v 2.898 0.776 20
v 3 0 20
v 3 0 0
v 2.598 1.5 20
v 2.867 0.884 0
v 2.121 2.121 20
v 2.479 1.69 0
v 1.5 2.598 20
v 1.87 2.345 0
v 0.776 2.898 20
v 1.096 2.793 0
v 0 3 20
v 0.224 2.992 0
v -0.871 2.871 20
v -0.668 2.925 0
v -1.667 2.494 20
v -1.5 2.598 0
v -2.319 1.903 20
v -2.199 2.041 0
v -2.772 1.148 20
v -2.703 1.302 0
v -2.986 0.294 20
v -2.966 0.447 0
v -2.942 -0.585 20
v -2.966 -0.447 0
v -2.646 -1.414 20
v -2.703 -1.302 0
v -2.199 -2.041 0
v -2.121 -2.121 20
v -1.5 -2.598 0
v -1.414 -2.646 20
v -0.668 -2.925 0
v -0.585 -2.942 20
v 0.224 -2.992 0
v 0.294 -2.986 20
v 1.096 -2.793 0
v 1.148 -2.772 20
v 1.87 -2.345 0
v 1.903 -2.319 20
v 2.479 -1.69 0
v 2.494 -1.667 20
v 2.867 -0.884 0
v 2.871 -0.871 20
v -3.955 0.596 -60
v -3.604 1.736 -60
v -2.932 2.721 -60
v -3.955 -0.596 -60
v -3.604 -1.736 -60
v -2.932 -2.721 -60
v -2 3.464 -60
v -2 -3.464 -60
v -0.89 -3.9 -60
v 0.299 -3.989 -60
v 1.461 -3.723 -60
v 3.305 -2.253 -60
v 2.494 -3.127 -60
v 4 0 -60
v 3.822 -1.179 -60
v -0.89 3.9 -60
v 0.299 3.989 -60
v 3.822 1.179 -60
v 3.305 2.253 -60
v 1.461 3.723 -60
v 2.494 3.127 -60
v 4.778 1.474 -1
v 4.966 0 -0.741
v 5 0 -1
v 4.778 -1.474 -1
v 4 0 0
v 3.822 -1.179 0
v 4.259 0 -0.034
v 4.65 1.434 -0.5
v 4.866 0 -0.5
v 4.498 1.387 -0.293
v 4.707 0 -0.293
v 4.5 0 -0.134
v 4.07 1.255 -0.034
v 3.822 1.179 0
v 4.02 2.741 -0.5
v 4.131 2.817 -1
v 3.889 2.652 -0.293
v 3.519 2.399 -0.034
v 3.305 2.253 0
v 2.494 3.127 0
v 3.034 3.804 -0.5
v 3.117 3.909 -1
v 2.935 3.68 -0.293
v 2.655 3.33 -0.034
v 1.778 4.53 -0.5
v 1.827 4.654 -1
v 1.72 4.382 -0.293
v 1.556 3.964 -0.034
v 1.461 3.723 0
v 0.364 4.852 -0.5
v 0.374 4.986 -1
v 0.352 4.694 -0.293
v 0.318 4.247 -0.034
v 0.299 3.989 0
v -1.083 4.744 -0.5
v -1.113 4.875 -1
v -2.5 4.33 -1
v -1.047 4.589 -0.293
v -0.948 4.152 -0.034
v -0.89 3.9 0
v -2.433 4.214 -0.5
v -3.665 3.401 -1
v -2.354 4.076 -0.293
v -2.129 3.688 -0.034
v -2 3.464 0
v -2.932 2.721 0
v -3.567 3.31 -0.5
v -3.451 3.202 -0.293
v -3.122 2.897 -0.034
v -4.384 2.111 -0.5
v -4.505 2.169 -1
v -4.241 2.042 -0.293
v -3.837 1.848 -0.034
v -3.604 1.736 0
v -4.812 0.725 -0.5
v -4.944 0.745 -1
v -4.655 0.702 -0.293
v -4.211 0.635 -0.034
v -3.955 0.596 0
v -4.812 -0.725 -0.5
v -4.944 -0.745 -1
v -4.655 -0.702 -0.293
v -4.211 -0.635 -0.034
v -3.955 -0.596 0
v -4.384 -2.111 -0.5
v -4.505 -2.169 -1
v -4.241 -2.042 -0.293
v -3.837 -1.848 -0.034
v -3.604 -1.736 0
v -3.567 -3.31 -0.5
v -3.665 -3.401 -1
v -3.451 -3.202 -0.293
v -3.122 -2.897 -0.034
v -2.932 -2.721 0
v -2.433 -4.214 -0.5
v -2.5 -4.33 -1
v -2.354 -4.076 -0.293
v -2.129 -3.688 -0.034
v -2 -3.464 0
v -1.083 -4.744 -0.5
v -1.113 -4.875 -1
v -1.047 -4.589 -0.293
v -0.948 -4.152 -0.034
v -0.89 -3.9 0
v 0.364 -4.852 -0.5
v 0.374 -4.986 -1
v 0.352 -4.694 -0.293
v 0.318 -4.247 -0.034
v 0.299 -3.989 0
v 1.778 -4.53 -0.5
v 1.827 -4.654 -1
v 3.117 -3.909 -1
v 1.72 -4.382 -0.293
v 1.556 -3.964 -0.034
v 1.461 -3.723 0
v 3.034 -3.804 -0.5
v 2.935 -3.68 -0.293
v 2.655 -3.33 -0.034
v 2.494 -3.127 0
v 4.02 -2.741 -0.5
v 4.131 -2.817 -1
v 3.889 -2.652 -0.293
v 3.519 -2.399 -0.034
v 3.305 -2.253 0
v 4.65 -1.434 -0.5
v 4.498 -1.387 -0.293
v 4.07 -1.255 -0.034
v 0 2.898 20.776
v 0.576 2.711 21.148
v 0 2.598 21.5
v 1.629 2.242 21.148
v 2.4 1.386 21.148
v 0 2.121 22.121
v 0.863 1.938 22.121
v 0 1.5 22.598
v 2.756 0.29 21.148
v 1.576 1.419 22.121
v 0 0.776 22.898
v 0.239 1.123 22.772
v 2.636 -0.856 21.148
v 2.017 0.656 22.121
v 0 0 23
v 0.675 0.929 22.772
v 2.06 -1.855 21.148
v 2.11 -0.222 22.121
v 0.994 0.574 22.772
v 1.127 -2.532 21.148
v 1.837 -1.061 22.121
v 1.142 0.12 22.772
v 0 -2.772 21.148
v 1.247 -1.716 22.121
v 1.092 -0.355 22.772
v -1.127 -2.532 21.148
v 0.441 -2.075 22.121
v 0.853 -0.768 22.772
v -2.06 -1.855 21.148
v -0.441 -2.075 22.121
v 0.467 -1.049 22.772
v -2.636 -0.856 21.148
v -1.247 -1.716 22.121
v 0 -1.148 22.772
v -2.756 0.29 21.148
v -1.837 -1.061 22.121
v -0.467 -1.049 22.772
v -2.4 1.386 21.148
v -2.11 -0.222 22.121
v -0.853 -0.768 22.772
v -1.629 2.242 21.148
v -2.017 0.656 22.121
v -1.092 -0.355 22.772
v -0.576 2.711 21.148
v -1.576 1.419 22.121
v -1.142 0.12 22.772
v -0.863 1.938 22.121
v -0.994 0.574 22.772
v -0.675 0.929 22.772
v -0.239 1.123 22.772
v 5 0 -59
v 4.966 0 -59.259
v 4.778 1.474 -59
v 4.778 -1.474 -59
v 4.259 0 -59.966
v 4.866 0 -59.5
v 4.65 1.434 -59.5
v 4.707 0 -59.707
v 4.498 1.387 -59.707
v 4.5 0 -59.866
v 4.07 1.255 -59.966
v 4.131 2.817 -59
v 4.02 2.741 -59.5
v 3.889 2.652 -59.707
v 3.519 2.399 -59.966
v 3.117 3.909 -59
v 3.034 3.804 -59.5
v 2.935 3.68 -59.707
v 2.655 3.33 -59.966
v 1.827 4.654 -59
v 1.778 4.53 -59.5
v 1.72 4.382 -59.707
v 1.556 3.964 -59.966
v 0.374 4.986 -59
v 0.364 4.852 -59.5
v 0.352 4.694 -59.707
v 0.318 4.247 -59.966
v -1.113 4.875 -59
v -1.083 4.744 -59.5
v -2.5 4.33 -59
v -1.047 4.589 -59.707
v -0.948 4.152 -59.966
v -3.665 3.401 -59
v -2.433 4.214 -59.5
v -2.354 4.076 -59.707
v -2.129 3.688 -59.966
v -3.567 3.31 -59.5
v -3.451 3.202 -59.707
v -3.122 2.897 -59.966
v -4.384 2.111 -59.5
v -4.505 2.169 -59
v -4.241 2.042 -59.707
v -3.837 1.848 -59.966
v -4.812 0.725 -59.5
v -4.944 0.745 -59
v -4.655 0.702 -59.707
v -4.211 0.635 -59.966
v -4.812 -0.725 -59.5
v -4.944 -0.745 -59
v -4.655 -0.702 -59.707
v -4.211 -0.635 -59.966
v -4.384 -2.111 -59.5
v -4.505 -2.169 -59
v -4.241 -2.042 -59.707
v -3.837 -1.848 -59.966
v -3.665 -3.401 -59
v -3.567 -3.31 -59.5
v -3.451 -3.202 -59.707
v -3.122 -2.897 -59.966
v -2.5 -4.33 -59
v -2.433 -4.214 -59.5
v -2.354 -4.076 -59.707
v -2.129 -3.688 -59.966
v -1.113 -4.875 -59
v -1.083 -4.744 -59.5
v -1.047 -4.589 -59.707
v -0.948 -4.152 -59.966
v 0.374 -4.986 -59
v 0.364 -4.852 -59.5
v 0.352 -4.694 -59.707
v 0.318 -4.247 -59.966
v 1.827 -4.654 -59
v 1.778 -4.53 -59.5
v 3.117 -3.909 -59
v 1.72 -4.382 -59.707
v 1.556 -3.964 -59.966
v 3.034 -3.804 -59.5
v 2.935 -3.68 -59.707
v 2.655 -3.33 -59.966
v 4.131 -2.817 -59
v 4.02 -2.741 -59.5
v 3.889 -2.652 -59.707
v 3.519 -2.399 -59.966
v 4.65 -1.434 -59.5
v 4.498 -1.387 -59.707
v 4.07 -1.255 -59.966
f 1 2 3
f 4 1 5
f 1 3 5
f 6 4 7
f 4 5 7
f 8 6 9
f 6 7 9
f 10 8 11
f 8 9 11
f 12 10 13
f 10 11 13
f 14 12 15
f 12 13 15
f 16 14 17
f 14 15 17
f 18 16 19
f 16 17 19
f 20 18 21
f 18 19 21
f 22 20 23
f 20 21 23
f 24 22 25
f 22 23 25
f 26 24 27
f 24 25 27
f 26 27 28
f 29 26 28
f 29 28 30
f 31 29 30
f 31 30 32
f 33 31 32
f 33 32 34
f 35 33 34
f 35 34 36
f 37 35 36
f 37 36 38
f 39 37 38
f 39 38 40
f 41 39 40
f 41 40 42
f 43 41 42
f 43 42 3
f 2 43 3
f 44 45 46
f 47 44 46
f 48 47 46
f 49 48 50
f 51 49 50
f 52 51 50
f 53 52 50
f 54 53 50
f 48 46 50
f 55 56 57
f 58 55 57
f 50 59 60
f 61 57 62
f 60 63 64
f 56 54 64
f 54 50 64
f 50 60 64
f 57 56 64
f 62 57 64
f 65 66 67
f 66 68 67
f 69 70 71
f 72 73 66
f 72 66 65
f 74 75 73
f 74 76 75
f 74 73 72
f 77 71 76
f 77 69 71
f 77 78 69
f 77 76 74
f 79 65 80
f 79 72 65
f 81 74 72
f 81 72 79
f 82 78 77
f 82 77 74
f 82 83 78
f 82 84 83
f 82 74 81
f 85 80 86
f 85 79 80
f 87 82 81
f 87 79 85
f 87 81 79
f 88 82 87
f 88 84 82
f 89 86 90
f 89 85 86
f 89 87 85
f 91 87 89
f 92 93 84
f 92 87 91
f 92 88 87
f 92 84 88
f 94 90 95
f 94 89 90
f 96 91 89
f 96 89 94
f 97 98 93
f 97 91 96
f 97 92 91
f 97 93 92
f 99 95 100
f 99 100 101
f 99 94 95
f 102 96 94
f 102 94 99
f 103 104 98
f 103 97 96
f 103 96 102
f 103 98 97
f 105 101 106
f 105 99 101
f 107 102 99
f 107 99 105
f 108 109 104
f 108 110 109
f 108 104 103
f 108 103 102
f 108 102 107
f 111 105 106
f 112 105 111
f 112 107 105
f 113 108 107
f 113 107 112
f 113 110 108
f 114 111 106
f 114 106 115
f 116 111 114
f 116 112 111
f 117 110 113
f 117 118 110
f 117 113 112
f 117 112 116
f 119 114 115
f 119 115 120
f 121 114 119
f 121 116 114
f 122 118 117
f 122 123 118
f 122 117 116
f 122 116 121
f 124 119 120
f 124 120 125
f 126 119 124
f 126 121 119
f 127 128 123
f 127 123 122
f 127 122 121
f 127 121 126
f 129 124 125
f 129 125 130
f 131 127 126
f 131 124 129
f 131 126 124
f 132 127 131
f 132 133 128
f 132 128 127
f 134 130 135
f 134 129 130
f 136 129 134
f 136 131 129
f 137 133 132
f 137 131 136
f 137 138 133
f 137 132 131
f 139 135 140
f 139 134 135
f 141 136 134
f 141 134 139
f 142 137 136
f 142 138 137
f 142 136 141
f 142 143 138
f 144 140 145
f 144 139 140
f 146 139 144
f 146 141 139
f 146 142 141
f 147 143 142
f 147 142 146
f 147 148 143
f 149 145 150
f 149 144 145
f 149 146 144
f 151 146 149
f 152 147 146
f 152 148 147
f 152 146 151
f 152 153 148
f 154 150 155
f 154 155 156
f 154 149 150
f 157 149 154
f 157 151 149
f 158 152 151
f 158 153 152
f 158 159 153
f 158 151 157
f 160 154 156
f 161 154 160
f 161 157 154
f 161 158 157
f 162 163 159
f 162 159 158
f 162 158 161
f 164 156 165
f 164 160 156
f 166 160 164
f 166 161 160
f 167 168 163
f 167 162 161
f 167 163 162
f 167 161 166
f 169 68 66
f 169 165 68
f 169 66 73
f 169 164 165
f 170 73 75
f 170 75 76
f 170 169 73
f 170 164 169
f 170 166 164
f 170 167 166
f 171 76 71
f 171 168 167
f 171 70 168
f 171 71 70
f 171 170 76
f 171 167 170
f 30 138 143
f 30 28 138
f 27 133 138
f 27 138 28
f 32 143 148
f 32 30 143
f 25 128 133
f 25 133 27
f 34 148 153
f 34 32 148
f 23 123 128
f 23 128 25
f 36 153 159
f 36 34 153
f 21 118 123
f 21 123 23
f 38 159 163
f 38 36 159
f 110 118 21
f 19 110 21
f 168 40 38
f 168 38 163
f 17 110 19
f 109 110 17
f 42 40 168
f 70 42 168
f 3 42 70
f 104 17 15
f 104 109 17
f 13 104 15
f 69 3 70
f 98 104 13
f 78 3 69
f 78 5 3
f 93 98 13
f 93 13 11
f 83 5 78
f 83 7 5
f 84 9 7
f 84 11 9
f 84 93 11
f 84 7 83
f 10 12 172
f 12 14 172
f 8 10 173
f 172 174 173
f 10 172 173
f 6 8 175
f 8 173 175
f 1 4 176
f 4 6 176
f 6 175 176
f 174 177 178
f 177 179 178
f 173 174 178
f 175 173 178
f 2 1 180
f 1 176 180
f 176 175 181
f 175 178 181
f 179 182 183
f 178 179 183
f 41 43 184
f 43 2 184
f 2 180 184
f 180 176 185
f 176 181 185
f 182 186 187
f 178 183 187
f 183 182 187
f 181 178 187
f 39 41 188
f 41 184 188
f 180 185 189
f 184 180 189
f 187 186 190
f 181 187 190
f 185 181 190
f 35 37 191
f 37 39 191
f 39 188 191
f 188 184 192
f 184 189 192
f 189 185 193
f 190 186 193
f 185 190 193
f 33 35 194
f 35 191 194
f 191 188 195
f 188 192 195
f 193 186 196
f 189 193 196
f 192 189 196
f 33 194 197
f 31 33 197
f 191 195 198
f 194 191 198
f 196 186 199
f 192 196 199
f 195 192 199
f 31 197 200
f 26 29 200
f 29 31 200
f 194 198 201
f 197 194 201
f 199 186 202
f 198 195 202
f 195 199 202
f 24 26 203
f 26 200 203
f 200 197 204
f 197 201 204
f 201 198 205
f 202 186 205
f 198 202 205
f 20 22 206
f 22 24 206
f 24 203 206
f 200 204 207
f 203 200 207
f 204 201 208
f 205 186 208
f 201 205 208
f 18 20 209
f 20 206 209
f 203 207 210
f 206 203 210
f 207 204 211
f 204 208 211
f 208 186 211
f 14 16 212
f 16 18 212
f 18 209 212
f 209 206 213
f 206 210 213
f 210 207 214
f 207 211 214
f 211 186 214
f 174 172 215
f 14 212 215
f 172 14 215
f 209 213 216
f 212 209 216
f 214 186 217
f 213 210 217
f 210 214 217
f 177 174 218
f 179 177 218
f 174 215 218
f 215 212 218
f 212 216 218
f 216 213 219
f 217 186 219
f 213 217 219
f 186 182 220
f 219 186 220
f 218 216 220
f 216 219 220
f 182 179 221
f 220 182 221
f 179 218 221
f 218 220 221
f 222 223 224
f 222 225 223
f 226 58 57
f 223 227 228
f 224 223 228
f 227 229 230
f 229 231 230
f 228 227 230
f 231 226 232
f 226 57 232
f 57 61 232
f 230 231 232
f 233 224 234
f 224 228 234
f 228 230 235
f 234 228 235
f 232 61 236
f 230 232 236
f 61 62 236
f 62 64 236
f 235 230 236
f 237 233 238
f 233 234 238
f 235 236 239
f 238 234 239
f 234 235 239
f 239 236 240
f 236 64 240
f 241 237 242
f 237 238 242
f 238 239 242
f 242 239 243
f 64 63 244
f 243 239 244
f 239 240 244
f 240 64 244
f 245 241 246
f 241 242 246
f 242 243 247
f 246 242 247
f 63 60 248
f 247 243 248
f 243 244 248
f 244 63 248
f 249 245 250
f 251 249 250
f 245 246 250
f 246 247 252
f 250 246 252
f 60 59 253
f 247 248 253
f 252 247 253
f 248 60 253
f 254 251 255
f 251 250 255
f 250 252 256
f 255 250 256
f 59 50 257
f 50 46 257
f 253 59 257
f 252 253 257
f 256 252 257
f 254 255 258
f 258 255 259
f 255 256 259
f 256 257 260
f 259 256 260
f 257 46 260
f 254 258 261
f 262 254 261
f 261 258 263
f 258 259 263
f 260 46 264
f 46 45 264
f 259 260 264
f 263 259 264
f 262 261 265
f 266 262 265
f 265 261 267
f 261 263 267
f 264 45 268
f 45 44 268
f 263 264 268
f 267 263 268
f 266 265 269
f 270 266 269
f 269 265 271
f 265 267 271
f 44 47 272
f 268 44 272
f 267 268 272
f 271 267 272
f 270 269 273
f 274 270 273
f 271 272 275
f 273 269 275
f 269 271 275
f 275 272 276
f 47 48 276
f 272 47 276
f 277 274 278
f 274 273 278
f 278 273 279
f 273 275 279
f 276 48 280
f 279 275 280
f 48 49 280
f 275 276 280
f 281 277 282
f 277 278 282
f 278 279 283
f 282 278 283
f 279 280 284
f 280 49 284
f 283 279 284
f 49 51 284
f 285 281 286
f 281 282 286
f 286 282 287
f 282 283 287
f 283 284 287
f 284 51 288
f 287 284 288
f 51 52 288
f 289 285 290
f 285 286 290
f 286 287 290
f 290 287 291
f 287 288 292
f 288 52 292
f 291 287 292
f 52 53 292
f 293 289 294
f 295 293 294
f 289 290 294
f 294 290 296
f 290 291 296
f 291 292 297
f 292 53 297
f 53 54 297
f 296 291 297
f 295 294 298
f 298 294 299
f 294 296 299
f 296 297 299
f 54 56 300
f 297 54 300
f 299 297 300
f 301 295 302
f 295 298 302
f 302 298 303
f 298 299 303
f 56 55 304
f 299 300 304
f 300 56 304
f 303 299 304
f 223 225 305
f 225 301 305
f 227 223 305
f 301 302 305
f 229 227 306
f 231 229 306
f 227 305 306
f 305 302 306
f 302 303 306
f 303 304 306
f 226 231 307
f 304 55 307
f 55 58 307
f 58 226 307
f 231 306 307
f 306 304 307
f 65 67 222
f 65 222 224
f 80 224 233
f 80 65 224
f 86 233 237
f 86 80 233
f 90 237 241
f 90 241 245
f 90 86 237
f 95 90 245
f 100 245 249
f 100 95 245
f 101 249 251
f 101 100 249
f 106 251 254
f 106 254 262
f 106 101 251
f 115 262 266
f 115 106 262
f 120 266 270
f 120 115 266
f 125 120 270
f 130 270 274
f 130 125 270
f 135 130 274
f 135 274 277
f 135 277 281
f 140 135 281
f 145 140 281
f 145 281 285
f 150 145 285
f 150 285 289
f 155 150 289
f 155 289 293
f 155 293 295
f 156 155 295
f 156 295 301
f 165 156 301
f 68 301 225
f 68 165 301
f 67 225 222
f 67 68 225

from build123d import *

# Parameters (mm, degrees)
SKETCH_1_R      = 5
EXTRUDE_1_DEPTH = 60
SKETCH_2_R      = 3
EXTRUDE_2_DEPTH = 20
FILLET_1_R      = 1


with BuildPart() as part:
    # 草图1 → 凸台-拉伸1 (new body)
    with BuildSketch(Plane.XY):
        Circle(SKETCH_1_R)
    extrude(amount=-EXTRUDE_1_DEPTH)

    # 草图2 → 凸台-拉伸2 (add)
    with BuildSketch(Plane.XY):
        Circle(SKETCH_2_R)
    extrude(amount=EXTRUDE_2_DEPTH)

    # 圆角1
    fillet_1_edges = [part.edges().sort_by_distance(p)[0] for p in [
        (-5, 0, 0),
        (-5, 0, -60),
    ]]
    fillet(fillet_1_edges, radius=FILLET_1_R)

    # 草图3 → 旋转1 (revolve)
    with BuildSketch(Plane(origin=(0, 0, 0), x_dir=(0, 0, -1), z_dir=(1, 0, 0))):
        with BuildLine():
            Line((-20, 0), (-20, 3))
            ThreePointArc((-20, 3), (-22.121320344, 2.121320344), (-23, 0))
            Line((-23, 0), (-20, 0))
        make_face()
    revolve(axis=Axis((0, 0, 23), (0, 0, -1)))


solid = part.part
